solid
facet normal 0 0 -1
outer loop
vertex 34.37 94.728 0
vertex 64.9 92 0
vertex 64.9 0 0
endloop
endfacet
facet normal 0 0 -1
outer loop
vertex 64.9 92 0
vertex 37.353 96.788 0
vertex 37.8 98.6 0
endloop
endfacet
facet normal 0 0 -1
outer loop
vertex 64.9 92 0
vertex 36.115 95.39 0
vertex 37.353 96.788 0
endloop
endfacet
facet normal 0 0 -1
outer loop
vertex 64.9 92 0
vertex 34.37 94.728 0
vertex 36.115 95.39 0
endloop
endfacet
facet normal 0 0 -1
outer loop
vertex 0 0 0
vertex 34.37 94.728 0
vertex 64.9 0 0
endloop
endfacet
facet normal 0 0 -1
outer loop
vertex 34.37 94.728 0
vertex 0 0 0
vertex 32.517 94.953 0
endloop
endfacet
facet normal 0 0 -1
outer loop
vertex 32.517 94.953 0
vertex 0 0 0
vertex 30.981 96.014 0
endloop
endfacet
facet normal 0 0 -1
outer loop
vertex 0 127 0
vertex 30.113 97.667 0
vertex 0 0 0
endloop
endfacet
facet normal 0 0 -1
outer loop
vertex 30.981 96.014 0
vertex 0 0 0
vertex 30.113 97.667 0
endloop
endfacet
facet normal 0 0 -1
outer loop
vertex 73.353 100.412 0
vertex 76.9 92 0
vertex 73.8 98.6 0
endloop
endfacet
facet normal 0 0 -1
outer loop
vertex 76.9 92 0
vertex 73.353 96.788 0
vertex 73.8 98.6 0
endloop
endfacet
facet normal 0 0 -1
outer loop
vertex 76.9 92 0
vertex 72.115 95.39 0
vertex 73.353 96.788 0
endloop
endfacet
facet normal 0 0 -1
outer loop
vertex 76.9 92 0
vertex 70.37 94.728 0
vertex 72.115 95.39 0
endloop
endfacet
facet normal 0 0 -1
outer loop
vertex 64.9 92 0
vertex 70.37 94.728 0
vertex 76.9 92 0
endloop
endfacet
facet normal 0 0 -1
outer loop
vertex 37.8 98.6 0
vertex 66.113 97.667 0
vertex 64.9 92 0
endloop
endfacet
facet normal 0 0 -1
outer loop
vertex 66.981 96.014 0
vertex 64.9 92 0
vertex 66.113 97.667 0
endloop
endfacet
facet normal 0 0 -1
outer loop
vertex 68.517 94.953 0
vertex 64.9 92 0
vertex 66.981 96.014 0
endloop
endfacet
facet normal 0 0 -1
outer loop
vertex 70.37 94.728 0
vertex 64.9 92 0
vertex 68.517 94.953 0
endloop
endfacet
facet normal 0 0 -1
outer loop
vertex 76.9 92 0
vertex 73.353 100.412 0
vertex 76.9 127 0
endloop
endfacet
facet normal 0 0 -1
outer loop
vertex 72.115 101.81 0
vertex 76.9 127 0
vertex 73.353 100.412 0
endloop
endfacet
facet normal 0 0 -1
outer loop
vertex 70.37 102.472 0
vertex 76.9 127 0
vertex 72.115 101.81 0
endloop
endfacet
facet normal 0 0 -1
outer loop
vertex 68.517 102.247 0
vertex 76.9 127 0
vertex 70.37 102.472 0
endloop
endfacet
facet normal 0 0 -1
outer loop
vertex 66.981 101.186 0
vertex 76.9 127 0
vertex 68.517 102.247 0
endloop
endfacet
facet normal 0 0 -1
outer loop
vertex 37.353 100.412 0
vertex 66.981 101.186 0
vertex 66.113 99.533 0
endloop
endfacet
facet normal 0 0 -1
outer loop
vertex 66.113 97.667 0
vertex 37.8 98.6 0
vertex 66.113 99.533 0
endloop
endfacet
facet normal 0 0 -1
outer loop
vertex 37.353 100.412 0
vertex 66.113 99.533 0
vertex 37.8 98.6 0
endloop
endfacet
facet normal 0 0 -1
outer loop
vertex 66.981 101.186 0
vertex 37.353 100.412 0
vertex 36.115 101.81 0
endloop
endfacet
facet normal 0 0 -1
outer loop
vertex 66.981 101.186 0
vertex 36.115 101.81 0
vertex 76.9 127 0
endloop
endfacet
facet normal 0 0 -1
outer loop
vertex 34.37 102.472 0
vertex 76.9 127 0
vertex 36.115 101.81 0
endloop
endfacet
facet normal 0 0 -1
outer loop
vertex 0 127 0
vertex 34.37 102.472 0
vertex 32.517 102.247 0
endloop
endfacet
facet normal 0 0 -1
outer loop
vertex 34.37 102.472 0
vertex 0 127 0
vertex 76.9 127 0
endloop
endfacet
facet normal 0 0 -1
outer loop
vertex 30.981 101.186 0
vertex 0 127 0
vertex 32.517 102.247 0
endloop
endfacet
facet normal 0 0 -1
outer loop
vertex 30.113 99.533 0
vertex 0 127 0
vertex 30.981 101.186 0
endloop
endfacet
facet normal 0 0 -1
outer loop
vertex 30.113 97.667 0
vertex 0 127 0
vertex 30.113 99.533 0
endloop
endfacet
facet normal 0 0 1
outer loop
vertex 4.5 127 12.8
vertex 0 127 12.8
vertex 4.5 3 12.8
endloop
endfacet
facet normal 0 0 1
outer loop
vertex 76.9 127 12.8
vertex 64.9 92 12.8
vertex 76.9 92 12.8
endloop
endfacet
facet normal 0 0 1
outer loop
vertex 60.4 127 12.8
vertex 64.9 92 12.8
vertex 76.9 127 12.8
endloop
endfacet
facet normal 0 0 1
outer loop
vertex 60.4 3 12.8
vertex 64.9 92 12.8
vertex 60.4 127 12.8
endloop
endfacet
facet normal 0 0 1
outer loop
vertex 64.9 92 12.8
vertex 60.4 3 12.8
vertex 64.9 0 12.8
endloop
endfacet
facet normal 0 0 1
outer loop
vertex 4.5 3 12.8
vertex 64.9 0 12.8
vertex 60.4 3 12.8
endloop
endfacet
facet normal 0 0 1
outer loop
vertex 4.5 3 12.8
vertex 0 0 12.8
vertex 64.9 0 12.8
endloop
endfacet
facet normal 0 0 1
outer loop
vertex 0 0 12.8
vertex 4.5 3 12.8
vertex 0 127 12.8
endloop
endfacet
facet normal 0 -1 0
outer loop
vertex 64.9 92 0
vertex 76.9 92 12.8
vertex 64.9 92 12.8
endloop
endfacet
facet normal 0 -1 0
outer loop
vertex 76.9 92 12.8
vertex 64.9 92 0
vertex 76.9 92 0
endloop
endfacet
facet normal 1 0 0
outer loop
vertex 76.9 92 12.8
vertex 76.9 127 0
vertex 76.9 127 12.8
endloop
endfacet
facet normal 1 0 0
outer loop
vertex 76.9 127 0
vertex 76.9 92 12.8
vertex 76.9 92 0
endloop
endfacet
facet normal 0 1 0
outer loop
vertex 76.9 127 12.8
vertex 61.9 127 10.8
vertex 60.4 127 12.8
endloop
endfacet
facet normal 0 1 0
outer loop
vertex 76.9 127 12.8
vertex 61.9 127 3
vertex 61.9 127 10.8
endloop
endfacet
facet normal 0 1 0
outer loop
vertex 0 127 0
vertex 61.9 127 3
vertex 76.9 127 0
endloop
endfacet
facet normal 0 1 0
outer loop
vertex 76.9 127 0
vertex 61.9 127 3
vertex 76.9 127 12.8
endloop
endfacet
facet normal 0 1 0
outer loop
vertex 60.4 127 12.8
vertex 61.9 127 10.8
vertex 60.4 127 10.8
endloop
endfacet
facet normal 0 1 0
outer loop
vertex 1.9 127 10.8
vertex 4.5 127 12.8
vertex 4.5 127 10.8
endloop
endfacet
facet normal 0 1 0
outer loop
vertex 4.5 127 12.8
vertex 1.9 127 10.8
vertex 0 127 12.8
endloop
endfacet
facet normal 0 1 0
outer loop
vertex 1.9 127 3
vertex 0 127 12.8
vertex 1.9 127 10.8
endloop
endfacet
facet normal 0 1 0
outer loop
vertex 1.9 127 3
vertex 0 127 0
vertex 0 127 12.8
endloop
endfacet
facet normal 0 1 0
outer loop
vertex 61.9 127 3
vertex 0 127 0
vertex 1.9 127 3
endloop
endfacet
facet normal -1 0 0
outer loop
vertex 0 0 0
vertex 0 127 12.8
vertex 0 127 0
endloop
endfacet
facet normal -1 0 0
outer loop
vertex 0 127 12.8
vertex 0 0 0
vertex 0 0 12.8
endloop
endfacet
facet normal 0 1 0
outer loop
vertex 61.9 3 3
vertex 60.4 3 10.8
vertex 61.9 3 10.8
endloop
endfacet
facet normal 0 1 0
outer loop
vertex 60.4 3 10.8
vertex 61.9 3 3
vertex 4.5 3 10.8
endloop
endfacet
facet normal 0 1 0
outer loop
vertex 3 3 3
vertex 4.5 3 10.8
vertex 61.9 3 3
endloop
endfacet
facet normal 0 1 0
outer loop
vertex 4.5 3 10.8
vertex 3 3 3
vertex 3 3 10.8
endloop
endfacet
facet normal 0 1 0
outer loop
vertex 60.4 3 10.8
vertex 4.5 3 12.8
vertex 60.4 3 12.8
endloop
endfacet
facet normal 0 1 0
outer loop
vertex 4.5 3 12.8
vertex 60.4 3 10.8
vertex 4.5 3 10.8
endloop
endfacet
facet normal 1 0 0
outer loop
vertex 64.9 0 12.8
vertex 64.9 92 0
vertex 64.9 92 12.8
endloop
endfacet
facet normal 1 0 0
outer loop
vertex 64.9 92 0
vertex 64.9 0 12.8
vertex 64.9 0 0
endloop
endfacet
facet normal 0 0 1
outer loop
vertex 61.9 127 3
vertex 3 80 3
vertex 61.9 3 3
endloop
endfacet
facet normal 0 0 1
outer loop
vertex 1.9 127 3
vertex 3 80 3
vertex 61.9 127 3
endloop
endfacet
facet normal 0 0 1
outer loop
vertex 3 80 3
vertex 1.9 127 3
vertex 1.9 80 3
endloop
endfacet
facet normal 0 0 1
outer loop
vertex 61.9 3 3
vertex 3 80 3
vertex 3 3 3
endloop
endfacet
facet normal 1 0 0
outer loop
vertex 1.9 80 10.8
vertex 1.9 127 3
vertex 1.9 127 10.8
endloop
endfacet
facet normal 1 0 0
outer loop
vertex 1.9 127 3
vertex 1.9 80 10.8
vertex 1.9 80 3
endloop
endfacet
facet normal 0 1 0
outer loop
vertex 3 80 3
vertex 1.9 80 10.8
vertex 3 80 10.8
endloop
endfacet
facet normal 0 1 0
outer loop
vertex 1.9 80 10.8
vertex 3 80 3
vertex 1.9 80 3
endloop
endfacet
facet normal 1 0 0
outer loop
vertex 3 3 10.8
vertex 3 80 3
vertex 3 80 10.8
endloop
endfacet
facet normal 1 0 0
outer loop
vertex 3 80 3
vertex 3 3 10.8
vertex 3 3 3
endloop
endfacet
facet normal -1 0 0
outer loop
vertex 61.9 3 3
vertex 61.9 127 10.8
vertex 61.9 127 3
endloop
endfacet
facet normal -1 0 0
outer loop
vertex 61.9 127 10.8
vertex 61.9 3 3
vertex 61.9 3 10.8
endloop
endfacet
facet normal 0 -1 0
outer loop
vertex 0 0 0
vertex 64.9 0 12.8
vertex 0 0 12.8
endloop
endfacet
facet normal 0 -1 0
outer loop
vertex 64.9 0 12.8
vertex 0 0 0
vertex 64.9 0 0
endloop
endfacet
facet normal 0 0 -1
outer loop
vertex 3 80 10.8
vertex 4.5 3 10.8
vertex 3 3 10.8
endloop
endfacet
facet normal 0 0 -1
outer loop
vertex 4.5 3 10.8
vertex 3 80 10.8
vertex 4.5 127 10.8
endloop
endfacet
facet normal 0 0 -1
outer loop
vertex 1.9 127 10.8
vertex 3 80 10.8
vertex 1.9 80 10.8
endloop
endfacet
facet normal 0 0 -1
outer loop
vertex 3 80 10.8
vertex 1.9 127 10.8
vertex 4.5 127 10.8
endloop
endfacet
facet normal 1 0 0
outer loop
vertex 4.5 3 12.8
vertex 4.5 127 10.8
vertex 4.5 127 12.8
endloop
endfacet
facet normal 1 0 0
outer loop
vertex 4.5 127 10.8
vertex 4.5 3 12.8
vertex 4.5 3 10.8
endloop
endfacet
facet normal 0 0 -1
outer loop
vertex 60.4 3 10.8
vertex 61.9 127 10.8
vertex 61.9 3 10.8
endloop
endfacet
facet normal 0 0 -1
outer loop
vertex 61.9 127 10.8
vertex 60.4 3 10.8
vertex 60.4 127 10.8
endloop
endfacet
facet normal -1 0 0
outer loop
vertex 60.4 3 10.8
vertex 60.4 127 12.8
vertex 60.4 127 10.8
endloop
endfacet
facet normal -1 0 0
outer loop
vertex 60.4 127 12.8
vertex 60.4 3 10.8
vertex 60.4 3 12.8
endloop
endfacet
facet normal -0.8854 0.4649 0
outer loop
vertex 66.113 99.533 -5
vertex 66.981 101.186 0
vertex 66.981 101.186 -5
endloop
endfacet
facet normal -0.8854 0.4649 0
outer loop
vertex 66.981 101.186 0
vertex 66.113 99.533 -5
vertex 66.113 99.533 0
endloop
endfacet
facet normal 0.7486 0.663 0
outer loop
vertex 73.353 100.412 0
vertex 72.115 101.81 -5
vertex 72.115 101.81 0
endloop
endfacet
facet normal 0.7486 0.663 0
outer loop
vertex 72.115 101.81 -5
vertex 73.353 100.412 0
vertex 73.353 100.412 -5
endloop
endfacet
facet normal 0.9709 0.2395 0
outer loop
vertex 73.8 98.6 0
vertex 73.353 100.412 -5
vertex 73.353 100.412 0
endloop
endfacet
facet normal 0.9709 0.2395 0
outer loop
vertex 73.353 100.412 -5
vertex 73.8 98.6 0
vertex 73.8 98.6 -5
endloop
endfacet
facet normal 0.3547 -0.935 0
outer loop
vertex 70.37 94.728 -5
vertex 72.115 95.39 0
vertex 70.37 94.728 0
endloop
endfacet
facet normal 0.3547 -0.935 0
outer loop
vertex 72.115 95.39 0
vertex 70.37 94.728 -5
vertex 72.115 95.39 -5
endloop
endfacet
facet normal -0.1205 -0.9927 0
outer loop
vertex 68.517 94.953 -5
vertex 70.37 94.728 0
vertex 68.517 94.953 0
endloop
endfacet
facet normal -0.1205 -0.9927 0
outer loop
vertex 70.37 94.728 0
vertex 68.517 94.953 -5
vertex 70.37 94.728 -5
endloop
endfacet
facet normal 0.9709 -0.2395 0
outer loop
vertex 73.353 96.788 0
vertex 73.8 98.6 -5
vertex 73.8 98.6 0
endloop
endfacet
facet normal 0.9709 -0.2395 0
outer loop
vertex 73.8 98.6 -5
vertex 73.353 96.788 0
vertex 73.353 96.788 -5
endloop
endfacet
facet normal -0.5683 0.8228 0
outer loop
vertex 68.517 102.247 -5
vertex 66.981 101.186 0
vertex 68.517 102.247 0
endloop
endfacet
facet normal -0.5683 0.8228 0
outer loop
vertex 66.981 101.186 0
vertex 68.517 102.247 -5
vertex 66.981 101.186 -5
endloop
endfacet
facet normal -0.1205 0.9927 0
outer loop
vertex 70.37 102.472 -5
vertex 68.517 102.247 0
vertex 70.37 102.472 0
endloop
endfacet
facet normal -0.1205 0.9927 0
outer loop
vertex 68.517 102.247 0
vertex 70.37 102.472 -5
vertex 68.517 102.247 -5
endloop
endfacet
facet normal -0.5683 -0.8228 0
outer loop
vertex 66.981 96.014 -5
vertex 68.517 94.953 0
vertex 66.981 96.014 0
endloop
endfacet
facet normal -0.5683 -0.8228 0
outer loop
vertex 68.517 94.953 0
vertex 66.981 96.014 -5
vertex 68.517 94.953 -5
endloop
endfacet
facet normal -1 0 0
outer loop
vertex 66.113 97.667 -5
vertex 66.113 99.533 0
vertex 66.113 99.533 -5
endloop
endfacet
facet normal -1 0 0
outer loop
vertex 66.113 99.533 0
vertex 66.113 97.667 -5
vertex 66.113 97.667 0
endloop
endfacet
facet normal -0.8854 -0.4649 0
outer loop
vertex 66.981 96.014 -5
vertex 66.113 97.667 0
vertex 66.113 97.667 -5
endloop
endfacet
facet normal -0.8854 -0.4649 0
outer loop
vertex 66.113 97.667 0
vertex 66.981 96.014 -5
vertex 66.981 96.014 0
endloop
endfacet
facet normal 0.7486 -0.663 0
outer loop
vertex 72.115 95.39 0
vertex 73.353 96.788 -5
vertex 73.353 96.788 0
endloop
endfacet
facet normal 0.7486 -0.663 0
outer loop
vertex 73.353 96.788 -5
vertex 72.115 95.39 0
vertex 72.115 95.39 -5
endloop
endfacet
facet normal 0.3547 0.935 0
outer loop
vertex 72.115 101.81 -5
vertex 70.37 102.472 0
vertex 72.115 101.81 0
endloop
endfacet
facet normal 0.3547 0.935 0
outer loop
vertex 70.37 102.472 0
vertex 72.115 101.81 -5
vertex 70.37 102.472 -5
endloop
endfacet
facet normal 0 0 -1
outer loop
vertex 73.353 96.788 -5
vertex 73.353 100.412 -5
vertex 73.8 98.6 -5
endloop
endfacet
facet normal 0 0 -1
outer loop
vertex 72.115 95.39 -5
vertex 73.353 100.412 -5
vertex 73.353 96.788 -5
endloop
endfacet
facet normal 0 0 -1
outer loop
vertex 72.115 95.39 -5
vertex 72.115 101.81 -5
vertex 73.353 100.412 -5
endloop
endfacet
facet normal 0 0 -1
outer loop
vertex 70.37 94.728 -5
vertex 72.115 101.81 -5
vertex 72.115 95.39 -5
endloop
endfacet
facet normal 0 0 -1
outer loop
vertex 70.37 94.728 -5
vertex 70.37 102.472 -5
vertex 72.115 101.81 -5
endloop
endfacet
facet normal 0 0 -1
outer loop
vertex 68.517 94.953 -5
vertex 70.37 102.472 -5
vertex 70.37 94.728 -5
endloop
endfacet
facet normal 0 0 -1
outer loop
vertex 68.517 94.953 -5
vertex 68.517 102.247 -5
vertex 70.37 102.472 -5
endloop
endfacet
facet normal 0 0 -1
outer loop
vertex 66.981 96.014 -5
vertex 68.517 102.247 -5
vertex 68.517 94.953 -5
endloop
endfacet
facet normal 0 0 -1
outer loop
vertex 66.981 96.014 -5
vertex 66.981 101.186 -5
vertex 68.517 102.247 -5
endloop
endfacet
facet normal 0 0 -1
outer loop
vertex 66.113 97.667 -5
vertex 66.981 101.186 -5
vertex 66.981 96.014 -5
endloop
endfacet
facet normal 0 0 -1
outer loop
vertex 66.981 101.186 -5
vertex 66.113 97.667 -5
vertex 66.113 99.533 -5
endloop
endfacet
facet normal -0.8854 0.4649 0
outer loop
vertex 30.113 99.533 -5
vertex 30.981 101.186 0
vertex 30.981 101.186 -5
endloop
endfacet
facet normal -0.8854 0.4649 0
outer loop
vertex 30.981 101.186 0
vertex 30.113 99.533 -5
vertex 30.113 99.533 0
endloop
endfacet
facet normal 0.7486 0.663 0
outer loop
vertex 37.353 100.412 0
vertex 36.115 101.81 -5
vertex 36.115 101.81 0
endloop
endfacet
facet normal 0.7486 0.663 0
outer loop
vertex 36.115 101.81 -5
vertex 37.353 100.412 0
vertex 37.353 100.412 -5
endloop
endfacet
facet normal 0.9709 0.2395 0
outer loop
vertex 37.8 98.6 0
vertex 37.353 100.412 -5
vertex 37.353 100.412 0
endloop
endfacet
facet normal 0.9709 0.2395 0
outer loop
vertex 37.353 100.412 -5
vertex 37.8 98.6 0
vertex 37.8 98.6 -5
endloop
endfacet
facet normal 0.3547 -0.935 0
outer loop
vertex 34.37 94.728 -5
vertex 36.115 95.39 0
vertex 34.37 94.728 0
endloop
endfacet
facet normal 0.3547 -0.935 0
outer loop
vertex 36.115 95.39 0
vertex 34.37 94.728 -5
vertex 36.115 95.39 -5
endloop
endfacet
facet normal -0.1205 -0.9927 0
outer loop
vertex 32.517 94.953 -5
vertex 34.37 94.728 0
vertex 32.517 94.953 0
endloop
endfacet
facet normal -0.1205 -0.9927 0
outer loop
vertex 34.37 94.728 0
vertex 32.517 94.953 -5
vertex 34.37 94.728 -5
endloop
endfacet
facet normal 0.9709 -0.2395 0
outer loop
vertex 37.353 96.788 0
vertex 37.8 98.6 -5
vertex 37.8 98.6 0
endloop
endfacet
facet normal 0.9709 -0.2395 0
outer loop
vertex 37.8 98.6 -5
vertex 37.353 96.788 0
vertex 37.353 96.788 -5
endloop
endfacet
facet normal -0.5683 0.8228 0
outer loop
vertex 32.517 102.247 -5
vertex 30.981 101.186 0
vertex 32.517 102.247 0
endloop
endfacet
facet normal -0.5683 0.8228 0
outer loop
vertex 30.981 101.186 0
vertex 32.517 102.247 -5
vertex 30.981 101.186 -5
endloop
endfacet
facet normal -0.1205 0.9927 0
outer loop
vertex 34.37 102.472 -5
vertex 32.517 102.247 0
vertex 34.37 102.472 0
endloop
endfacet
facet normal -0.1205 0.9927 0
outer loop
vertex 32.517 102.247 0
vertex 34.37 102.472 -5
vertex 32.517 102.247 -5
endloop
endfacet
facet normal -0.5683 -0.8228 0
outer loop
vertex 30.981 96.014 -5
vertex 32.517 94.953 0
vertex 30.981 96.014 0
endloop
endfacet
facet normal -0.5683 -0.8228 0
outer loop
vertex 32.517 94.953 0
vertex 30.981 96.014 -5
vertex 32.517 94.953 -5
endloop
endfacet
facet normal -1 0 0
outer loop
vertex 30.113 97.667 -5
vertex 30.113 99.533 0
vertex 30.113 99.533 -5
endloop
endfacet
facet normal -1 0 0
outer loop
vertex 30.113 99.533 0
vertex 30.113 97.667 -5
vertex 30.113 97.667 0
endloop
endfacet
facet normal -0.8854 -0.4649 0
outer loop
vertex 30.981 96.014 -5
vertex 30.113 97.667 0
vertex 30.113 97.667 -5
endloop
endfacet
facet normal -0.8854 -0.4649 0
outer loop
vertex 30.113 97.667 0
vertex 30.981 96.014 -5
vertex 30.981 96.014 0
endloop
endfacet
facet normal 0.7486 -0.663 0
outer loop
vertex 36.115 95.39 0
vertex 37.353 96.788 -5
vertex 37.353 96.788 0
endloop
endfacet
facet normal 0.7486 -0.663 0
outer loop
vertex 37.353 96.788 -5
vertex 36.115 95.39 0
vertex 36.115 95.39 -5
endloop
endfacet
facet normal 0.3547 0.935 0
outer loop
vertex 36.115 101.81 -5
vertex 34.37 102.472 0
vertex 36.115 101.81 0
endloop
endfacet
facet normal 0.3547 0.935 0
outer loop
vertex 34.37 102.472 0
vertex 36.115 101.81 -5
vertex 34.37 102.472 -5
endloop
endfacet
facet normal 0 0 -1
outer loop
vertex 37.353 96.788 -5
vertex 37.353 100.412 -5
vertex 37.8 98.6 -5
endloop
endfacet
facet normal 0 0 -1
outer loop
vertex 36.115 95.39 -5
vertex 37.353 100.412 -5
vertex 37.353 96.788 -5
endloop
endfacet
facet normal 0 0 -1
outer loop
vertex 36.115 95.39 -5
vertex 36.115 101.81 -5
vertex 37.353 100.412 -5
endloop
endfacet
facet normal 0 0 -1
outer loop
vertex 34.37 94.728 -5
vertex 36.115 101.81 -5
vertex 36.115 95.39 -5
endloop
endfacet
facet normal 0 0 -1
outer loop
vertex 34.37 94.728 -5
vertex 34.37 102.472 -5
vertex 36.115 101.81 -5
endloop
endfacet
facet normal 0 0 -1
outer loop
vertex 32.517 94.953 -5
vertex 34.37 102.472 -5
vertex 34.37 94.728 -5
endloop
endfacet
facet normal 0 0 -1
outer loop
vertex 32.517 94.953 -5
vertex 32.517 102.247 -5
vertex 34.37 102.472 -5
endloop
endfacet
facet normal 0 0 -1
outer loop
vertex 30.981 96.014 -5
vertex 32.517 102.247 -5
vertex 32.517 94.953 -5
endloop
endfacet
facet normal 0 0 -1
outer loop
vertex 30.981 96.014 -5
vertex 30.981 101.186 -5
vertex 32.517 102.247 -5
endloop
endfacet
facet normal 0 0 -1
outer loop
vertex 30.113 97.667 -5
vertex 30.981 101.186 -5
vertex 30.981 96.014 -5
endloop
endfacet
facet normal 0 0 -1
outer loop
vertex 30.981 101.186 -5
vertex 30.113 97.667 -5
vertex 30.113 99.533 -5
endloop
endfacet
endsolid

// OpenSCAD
difference(){
color("cyan")
    translate([0, 3, 0])
        linear_extrude(height = 12.8)
             polygon( points=[[0,0],[64.9,0],[64.9,89],[76.9,89],[76.9,124],[0,124]] );
color("yellow")
    translate([0, 3, 3])
        linear_extrude(height = 9.8)
             polygon( points=[[3,0],[61.9,0],[61.9,124],[1.9,124],[1.9,77],[3,77]] );
}
color("red")
    translate([0, -0, 0])
        linear_extrude(height = 12.8)
             polygon( points=[[0,0],[64.9,0],[64.9,3],[0,3]] );
color("red")
    translate([0, 3, 10.8])
        linear_extrude(height = 2)
             polygon( points=[[3,0],[4.5,0],[4.5,124],[1.9,124],[1.9,77],[3,77]] );
color("red")
    translate([0, 3, 10.8])
        linear_extrude(height = 2)
             polygon( points=[[60.4,0],[61.9,0],[61.9,124],[60.4,124]] );

color("red")    
    translate([69.9,98.6,-5])
            cylinder(d=7.8, h=5);
color("red")    
    translate([33.9,98.6,-5])
            cylinder(d=7.8, h=5);
